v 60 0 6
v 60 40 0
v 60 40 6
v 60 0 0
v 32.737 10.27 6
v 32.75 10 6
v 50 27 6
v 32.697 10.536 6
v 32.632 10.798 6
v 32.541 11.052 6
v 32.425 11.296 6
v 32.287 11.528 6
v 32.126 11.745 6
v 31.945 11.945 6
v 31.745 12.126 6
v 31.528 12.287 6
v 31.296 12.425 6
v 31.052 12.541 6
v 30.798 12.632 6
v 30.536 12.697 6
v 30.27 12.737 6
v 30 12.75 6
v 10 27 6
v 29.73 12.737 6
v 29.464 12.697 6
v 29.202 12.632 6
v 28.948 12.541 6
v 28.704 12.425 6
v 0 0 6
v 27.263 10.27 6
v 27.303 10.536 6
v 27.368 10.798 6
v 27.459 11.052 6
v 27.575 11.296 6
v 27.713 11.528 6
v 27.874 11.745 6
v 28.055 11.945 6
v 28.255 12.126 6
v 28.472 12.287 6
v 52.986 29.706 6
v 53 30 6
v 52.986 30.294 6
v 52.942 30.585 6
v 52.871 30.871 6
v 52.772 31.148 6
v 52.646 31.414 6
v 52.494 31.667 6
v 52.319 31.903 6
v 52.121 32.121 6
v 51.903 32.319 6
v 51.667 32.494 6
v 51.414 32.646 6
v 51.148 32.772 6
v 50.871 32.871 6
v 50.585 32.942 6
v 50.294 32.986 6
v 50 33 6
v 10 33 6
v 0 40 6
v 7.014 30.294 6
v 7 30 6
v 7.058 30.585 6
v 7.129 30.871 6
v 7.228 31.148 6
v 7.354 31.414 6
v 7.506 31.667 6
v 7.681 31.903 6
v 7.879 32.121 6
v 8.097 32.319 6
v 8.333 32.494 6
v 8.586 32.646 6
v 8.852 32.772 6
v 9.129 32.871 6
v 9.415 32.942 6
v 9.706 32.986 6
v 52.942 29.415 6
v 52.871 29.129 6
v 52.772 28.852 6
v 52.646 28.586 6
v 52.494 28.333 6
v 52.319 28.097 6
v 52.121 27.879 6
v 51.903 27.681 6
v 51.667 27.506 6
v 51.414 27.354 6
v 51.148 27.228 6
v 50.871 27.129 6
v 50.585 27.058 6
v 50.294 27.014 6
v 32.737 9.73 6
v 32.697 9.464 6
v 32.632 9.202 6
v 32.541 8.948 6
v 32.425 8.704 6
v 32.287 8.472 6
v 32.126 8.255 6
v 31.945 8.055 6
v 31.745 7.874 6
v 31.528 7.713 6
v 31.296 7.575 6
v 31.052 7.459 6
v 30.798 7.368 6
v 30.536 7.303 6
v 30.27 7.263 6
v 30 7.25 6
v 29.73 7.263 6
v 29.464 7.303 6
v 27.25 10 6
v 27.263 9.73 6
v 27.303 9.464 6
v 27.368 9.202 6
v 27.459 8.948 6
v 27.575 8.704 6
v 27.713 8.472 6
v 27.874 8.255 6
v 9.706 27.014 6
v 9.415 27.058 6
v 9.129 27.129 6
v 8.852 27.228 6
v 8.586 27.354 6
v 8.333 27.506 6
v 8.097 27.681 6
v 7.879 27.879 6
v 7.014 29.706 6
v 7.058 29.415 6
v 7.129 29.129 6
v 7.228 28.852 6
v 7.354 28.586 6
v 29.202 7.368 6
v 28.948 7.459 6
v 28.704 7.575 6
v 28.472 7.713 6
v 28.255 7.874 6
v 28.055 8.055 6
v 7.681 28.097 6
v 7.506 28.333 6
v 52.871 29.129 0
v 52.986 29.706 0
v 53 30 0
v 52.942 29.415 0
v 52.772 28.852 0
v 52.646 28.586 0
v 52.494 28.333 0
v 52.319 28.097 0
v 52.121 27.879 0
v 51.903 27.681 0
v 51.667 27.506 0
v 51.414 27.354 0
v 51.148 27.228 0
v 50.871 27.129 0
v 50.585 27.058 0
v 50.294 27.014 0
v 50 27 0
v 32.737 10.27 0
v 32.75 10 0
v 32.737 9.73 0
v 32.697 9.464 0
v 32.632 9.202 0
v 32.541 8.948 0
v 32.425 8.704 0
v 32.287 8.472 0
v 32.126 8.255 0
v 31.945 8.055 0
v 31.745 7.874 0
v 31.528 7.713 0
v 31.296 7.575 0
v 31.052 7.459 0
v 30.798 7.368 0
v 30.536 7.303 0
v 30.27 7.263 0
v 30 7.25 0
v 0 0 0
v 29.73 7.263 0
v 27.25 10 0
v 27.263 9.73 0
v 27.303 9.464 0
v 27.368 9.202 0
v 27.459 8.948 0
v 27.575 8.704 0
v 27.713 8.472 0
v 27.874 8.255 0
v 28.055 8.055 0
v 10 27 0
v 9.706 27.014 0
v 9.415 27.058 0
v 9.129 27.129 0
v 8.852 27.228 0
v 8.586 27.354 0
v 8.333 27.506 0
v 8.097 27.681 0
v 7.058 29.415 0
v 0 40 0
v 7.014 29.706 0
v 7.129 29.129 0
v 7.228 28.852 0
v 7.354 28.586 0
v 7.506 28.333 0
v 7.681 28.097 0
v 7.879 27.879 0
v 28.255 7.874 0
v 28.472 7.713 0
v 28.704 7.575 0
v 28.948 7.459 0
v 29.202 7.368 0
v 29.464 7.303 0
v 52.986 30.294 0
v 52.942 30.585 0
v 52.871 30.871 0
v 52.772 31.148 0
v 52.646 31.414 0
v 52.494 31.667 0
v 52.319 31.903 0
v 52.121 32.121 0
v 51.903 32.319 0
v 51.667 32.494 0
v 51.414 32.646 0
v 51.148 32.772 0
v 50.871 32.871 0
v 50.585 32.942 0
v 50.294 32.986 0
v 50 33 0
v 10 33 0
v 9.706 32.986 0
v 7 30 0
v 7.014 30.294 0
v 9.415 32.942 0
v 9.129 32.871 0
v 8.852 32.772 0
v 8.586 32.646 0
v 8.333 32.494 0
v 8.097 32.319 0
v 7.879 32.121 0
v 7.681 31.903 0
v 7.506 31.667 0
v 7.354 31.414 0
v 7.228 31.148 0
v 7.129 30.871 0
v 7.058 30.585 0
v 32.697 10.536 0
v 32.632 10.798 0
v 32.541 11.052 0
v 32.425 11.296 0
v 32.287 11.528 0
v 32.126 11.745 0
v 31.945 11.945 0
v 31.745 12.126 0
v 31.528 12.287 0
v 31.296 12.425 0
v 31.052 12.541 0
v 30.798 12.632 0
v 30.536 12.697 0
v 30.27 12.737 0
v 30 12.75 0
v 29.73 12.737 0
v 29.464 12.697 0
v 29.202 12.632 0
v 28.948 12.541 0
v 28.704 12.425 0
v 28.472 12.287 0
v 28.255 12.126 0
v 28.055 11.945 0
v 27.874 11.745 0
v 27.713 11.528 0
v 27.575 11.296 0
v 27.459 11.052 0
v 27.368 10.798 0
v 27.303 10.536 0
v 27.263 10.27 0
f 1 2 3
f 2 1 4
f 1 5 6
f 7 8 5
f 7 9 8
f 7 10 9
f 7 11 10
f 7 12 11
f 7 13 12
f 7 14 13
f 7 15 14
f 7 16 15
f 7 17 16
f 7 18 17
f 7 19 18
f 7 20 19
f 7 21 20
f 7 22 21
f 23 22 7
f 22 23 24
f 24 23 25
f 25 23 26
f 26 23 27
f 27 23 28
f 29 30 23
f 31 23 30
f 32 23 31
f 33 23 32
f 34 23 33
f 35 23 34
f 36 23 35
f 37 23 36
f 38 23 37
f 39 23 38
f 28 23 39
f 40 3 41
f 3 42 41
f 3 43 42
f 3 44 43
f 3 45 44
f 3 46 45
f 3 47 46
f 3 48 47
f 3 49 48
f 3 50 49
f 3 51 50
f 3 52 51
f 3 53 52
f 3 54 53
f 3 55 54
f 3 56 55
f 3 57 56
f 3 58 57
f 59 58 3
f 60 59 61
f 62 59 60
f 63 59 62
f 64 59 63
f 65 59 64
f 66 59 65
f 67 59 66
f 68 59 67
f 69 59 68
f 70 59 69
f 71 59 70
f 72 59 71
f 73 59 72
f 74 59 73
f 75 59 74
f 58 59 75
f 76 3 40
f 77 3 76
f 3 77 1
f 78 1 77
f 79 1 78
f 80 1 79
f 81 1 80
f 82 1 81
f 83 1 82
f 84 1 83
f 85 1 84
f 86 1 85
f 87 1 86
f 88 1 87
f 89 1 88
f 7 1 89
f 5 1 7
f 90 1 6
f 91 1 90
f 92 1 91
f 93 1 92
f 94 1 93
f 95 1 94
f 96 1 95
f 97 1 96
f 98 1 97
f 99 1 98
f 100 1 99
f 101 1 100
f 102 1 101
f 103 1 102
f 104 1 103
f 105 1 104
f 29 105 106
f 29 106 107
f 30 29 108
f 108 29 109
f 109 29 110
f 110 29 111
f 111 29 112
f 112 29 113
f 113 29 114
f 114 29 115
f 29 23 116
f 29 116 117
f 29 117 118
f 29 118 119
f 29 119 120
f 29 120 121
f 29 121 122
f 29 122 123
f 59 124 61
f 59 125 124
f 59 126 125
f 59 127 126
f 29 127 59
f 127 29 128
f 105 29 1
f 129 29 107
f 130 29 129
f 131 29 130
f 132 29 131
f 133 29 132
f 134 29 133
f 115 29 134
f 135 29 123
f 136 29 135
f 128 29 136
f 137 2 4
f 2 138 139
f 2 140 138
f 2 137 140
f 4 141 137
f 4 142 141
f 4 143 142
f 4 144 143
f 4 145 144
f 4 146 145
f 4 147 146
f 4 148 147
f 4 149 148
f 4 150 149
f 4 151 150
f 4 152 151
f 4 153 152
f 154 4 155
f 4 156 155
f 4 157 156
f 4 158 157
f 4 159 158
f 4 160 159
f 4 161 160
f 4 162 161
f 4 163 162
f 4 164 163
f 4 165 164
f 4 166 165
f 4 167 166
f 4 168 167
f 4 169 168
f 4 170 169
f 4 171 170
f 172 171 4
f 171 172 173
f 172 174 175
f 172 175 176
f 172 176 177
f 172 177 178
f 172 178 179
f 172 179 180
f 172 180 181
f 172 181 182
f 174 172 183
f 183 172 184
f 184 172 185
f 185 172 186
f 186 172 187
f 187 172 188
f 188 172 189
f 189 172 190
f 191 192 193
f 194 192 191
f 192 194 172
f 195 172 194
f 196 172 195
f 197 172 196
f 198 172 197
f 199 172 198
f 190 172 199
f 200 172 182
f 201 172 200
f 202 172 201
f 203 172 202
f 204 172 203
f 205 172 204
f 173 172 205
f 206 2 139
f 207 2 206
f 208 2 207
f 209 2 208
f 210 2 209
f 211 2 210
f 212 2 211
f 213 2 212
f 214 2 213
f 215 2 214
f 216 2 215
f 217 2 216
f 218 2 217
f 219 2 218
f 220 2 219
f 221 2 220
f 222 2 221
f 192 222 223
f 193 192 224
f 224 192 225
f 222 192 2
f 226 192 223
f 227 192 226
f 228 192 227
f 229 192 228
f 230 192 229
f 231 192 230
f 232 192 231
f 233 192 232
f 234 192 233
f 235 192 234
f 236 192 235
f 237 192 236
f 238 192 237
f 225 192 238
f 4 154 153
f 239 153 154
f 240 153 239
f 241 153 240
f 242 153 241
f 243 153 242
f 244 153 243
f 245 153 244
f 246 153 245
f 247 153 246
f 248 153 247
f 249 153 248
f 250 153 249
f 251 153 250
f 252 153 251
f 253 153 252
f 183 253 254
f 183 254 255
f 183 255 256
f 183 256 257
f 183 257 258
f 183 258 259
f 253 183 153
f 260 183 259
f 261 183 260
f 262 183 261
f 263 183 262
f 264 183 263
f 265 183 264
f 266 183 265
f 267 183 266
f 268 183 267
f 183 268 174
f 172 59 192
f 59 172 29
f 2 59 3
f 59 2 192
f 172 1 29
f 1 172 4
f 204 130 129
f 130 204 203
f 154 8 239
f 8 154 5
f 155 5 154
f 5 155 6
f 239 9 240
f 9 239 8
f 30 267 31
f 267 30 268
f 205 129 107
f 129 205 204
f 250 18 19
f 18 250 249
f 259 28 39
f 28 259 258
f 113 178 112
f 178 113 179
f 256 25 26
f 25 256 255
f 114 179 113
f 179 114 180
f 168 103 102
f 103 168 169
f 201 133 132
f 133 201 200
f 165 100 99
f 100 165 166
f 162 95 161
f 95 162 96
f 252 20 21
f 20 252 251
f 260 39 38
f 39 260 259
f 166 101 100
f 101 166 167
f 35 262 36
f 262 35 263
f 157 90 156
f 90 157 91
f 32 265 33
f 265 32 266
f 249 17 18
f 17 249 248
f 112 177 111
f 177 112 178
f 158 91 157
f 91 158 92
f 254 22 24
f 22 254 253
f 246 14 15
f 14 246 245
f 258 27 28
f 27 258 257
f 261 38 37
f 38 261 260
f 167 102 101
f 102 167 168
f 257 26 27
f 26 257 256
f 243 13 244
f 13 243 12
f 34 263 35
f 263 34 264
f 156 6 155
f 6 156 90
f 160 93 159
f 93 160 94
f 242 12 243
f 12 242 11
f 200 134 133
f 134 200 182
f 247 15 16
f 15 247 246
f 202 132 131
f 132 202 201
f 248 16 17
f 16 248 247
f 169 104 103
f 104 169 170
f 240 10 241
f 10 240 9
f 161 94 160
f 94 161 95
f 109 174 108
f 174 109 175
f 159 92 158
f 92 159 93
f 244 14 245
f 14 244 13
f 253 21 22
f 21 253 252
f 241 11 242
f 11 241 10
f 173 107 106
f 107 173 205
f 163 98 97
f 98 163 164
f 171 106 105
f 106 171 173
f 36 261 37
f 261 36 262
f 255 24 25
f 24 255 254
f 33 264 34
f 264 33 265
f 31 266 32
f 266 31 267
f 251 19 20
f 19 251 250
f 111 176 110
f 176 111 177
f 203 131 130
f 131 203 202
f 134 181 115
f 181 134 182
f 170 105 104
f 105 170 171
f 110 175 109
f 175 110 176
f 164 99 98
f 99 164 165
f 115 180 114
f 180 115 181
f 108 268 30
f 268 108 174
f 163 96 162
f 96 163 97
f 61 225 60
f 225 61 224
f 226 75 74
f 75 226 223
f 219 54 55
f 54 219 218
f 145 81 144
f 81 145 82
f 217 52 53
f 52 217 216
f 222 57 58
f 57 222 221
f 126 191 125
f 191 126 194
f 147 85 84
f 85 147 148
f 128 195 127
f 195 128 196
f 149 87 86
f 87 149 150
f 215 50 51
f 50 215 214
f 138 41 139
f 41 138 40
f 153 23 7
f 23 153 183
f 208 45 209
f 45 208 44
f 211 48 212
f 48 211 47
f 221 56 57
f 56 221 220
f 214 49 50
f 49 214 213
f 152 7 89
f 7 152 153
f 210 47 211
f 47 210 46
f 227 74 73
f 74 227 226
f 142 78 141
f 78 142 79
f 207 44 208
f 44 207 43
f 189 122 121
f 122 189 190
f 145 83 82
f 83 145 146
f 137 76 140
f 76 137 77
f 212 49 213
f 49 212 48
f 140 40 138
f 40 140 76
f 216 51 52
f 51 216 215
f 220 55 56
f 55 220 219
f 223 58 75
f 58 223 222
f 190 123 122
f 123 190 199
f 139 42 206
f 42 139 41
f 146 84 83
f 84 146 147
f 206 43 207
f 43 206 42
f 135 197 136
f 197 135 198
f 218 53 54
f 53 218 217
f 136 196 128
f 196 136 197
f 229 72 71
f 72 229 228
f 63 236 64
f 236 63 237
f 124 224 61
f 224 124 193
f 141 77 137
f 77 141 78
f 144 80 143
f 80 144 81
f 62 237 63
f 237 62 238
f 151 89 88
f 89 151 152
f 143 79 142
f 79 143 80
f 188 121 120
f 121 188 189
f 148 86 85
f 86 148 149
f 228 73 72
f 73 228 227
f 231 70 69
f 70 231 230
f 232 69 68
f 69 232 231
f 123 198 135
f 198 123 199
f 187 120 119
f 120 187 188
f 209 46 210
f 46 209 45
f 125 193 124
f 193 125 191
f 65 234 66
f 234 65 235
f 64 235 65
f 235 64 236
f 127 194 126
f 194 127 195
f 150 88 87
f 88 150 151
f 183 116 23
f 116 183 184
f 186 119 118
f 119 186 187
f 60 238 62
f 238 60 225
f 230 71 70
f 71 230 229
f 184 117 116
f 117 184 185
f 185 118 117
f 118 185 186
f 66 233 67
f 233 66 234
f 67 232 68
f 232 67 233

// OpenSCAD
// file: ../../config.scad
// Ebike Configuration
// All dimensions in mm

// =============================================================================
// RIDER PARAMETERS
// =============================================================================
rider_height = 173;
rider_weight = 55;

// =============================================================================
// FRAME GEOMETRY
// =============================================================================
frame_size = 520;                    // Seat tube center-to-top
top_tube_effective = 545;
head_tube_length = 140;
head_tube_angle = 70;
seat_tube_angle = 72;
chainstay_length = 460;
bb_drop = 65;
wheelbase = 1080;
standover_height = 450;              // Step-through
stack = 620;
reach = 370;

// =============================================================================
// TUBE DIAMETERS
// =============================================================================
head_tube_id = 44;                   // 1-1/8" straight steerer
head_tube_od = 49;
seat_tube_id = 27.2;                 // Standard seatpost
down_tube_od = 44;
top_tube_od = 32;
seat_stay_od = 16;
chainstay_od = 22;

// =============================================================================
// MOTOR CONFIGURATION
// =============================================================================
motor_type = "mid-drive";
bb_shell_width = 68;                 // BSA standard
bb_clearance_width = 120;

// =============================================================================
// DROPOUT PARAMETERS
// =============================================================================
dropout_material = "6061-T6";
dropout_thickness = 10;
dropout_width = 45;
dropout_height = 80;
dropout_axle_spacing = 142;          // Boost thru-axle
dropout_axle_diameter = 12;

// =============================================================================
// BOTTOM BRACKET SHELL
// =============================================================================
bb_shell_od = 42;
bb_shell_id = 34.8;                  // BSA threaded
bb_thread_tpi = 24;                  // BSA 1.37" x 24 TPI

// =============================================================================
// HEAD TUBE
// =============================================================================
// Uses head_tube_length, head_tube_id, head_tube_od from above

// =============================================================================
// SEAT COLLAR
// =============================================================================
seat_collar_id = 31.8;               // For 27.2mm post with shim
seat_collar_od = 38;
seat_collar_height = 25;

// =============================================================================
// MOTOR MOUNT
// =============================================================================
motor_mount_thickness = 8;
motor_mount_width = 120;
motor_mount_height = 100;

// =============================================================================
// BATTERY MOUNT
// =============================================================================
battery_mount_thickness = 6;
battery_mount_width = 60;
battery_mount_height = 40;
battery_mount_quantity = 4;

// =============================================================================
// BRAKE MOUNT (Post Mount)
// =============================================================================
brake_mount_thickness = 10;
brake_mount_width = 80;
brake_mount_height = 50;
brake_post_bolt_spacing = 74;        // Post mount standard
brake_rotor_size_front = 180;
brake_rotor_size_rear = 160;

// =============================================================================
// CABLE GUIDES
// =============================================================================
cable_guide_length = 25;
cable_guide_width = 15;
cable_guide_height = 8;
cable_guide_quantity = 6;

// =============================================================================
// HEADSET CUPS
// =============================================================================
headset_cup_od = 44;
headset_bearing_seat = 30;

// =============================================================================
// RACK/FENDER MOUNTS
// =============================================================================
rack_mount_length = 30;
rack_mount_width = 20;
rack_mount_height = 10;
rack_mount_thread = 5;               // M5
rack_mount_quantity = 4;

// =============================================================================
// GUSSET PLATES
// =============================================================================
gusset_thickness = 6;
gusset_width = 80;
gusset_height = 60;
gusset_quantity = 2;

// =============================================================================
// COMPOSITE FRAME TUBES (FibreSeeker 3)
// =============================================================================
// Wall thickness for carbon fiber reinforced tubes
tube_wall_thickness = 3;

// Down tube (curved for step-through)
down_tube_length = 650;              // Along curve
down_tube_curve_radius = 800;        // Radius of curve

// Seat tube
seat_tube_length = 520;              // frame_size
seat_tube_od = 34;                   // Outer diameter

// Chainstays
chainstay_wall = 2.5;

// Seat stays
seat_stay_length = 480;
seat_stay_wall = 2;

// =============================================================================
// TUBE SECTIONING (for build volume constraints)
// =============================================================================
// Joint design: internal aluminum sleeve with M6 through-bolts
joint_overlap = 30;                  // Overlap length per joint
joint_bolt_diameter = 6;             // M6 bolts
joint_bolt_count = 2;                // Bolts per joint

// Section counts
down_tube_sections = 3;
seat_tube_sections = 2;
chainstay_sections = 2;
seat_stay_sections = 2;

// Sleeve parameters (CNC milled aluminum)
sleeve_wall_thickness = 2;
sleeve_length = 60;                  // Total sleeve length (2x overlap)

// =============================================================================
// MANUFACTURING TOLERANCES
// =============================================================================
tolerance_press_fit = 0.05;
tolerance_general = 0.1;

// =============================================================================
// COMMON CONSTANTS
// =============================================================================
$fn = 64;                            // Circle resolution
epsilon = 0.01;                      // For boolean operations
// main file
// Battery Mount Bracket
// CNC milled component for NestWorks C500

include <../../config.scad>

module battery_mount() {
    difference() {
        // Main bracket body
        cube([battery_mount_width, battery_mount_height, battery_mount_thickness]);

        // Frame mounting hole (M5)
        translate([battery_mount_width/2, 10, -epsilon])
            cylinder(h = battery_mount_thickness + 2*epsilon, d = 5.5);

        // Battery rail slot
        translate([10, battery_mount_height - 10, -epsilon])
            hull() {
                cylinder(h = battery_mount_thickness + 2*epsilon, d = 6);
                translate([battery_mount_width - 20, 0, 0])
                    cylinder(h = battery_mount_thickness + 2*epsilon, d = 6);
            }
    }
}

// Render for preview
battery_mount();
